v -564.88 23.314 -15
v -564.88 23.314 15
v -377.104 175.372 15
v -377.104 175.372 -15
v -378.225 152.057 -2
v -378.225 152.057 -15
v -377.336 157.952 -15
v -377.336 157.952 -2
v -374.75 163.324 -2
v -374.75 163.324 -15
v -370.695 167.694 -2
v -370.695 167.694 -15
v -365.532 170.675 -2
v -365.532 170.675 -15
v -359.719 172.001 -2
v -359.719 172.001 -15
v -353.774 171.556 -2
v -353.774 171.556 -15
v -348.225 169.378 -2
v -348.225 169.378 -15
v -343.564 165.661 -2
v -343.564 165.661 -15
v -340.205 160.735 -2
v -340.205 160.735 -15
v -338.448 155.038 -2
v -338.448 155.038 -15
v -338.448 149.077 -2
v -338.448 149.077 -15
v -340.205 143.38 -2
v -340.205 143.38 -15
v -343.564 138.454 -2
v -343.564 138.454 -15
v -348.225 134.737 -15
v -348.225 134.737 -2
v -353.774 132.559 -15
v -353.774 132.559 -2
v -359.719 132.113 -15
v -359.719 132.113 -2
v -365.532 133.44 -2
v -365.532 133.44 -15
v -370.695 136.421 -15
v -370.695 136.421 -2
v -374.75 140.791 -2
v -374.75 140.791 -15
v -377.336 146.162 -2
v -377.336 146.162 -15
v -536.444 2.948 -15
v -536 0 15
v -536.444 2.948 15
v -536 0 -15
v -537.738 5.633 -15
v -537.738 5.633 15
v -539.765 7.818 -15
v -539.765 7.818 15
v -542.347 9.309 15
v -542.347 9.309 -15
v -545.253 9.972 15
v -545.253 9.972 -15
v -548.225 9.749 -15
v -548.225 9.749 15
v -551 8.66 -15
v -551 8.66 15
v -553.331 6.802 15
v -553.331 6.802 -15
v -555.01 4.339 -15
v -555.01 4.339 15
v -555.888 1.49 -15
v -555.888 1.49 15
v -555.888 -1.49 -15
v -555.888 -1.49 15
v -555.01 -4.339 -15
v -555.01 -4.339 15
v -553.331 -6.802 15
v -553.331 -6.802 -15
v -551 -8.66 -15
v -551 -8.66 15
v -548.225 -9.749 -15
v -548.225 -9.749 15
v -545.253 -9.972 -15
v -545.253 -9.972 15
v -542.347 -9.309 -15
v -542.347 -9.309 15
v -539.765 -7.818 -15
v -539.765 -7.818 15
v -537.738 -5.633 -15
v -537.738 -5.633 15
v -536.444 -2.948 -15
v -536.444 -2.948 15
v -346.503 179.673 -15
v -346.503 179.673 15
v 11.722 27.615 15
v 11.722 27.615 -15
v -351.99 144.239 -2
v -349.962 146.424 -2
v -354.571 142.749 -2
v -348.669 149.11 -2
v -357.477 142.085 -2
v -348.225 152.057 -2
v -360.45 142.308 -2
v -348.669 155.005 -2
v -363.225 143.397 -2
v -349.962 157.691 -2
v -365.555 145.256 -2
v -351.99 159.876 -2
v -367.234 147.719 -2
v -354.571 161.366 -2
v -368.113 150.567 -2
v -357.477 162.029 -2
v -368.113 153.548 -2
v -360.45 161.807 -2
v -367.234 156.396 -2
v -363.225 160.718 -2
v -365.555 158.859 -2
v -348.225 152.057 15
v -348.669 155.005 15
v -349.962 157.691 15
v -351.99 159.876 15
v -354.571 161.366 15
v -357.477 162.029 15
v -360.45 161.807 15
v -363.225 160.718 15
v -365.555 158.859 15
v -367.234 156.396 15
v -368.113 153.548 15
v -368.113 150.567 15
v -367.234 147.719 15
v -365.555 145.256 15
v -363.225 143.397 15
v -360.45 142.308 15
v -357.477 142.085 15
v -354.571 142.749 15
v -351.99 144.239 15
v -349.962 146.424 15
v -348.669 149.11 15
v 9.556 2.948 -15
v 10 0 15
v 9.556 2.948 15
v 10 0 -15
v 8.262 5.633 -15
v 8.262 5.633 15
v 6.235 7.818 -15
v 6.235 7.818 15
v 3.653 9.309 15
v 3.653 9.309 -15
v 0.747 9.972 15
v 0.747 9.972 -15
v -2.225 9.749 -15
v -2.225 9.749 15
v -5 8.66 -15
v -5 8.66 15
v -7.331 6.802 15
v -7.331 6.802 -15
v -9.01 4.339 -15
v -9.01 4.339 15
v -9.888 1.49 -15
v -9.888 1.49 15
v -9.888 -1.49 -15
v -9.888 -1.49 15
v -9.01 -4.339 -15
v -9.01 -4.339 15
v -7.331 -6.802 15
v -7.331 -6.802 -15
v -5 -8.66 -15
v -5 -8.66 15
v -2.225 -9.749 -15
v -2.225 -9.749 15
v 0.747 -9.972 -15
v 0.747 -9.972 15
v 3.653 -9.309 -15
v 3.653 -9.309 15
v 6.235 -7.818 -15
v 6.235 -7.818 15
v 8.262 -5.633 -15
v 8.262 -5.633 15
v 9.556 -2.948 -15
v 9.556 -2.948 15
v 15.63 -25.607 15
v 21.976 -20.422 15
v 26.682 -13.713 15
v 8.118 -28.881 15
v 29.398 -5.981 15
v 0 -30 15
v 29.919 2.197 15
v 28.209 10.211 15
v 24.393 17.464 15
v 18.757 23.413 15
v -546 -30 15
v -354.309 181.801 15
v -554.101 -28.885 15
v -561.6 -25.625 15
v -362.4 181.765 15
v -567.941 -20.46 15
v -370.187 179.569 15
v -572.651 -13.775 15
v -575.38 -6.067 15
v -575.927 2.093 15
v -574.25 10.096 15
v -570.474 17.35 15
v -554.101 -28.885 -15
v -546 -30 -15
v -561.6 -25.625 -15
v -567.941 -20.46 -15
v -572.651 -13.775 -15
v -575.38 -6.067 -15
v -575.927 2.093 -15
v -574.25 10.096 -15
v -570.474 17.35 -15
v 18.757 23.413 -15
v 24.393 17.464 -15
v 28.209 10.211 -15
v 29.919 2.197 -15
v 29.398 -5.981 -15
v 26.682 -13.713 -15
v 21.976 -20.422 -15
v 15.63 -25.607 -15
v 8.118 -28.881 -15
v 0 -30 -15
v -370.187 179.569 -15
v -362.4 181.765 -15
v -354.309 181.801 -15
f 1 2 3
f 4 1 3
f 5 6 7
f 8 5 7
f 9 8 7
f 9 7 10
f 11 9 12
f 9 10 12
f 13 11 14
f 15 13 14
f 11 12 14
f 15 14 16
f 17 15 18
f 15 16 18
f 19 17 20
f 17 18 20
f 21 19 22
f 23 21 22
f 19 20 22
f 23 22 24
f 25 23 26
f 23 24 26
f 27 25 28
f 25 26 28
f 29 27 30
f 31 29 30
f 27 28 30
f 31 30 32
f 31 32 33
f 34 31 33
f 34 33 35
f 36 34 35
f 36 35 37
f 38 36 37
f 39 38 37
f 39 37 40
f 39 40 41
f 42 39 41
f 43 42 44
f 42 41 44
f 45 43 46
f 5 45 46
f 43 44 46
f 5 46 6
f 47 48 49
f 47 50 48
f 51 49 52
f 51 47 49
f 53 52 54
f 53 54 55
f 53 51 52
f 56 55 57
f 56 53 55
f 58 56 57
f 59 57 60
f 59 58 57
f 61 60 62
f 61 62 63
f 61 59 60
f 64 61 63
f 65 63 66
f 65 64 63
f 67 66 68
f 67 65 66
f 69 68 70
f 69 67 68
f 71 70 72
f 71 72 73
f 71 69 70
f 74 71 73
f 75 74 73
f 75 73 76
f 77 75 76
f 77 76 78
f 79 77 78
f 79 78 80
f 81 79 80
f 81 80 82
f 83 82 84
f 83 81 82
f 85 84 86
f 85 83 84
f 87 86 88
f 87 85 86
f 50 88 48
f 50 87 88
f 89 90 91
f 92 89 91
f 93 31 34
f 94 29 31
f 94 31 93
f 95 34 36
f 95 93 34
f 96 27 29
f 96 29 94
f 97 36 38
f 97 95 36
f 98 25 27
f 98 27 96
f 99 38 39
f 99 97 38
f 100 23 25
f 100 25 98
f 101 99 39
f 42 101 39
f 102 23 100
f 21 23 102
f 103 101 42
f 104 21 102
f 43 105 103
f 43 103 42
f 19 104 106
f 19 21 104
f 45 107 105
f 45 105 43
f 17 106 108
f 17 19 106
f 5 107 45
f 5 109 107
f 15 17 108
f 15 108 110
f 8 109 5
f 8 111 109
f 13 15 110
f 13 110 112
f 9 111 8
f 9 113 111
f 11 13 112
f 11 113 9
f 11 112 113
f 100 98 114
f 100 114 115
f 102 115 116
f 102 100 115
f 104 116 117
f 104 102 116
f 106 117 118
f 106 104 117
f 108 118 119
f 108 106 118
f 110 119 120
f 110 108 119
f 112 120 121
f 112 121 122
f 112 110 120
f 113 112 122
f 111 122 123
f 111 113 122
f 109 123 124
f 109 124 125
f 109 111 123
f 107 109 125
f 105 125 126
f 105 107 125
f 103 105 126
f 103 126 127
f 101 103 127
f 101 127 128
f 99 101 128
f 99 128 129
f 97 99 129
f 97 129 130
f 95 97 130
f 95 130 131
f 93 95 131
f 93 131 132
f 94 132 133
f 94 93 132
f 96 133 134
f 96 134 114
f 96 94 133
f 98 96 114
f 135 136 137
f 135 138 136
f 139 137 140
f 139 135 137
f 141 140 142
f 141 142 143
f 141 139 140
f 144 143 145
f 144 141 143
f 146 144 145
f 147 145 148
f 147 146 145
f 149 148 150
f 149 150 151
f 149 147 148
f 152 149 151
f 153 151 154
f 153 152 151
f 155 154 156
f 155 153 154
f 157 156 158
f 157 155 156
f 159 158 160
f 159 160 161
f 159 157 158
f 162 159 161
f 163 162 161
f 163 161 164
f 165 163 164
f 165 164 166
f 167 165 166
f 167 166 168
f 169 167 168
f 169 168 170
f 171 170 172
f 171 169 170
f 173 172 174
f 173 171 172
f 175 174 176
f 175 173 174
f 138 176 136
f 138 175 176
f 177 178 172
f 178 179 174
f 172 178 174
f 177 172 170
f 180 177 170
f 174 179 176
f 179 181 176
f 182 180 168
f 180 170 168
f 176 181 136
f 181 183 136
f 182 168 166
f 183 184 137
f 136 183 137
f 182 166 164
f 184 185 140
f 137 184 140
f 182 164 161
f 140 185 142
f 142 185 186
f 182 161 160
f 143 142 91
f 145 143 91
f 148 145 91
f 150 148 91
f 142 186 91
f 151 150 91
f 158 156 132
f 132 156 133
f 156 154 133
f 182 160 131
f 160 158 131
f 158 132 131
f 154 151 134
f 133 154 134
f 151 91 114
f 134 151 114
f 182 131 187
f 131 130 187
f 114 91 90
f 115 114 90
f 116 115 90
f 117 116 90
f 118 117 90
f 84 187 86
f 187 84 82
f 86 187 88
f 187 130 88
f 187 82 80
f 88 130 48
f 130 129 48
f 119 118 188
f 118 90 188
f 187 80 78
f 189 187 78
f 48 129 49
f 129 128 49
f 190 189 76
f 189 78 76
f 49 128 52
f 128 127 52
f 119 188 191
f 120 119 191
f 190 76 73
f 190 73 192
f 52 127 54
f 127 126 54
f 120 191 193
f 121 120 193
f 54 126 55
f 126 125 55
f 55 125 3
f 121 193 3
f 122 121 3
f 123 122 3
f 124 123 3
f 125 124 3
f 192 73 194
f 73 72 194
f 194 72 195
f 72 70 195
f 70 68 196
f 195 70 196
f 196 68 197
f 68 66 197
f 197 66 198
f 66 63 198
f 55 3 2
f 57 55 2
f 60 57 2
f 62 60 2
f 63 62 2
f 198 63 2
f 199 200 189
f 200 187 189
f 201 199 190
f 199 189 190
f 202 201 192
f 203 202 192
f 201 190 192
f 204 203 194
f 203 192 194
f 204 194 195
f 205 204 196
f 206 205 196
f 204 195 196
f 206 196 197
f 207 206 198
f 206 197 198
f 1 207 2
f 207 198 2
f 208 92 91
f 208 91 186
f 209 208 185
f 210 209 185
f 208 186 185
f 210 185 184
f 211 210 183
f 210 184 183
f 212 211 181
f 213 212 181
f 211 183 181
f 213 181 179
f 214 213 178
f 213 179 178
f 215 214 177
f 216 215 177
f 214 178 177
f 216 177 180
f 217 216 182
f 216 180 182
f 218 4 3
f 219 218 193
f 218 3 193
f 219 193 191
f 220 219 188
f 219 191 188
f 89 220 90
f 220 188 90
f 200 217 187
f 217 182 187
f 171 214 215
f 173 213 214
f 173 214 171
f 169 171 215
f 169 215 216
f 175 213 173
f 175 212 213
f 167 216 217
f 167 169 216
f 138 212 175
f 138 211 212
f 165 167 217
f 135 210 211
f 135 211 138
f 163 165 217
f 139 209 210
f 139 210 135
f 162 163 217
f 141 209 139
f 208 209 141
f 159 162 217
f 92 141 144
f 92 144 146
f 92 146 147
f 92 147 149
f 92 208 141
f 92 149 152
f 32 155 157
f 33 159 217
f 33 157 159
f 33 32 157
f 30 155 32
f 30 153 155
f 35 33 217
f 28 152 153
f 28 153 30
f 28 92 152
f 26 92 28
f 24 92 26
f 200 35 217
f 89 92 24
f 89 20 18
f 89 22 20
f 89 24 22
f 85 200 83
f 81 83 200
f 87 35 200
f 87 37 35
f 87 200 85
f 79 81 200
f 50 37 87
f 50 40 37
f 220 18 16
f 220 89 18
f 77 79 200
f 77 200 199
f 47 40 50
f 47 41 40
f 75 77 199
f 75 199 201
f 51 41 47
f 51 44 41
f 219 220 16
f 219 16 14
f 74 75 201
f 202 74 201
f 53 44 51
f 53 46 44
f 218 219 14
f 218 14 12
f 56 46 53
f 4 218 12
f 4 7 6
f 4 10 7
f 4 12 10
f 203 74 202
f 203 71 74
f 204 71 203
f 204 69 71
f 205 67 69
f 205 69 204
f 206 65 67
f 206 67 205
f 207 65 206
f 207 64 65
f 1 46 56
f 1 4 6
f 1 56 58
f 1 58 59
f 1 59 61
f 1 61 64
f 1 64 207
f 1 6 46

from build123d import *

# Parameters (mm, degrees)
SKETCH_1_R          = 10
EXTRUDE_1_DEPTH     = 15
SKETCH_2_R          = 20
CUT_EXTRUDE_1_DEPTH = 13


with BuildPart() as part:
    # Эскиз1 → Бобышка-Вытянуть1 (new body, symmetric)
    with BuildSketch(Plane.XY):
        with BuildLine():
            Line((-346.502827781, 179.672535461), (11.721933855, 27.615145604))
            ThreePointArc((11.721933855, 27.615145604), (29.397741139, -5.981038033), (0, -30))
            Line((0, -30), (-546, -30))
            ThreePointArc((-546, -30), (-574.279244733, -10.014205777), (-564.879611731, 23.314378844))
            Line((-564.879611731, 23.314378844), (-377.104373367, 175.371768701))
            ThreePointArc((-377.104373367, 175.371768701), (-362.399954664, 181.765431919), (-346.502827781, 179.672535461))
        make_face()
        with Locations((-546, 0)):
            Circle(SKETCH_1_R, mode=Mode.SUBTRACT)
        with Locations((-358.224761635, 152.057389857)):
            Circle(SKETCH_1_R, mode=Mode.SUBTRACT)
        Circle(SKETCH_1_R, mode=Mode.SUBTRACT)
    extrude(amount=EXTRUDE_1_DEPTH, both=True)

    # Эскиз2 → Вырез-Вытянуть1 (cut)
    with BuildSketch(Plane(origin=(0, 0, -15), x_dir=(-1, 0, 0), z_dir=(0, 0, -1))):
        with Locations((358.224761635, 152.057389857)):
            Circle(SKETCH_2_R)
    extrude(amount=-CUT_EXTRUDE_1_DEPTH, mode=Mode.SUBTRACT)


solid = part.part
